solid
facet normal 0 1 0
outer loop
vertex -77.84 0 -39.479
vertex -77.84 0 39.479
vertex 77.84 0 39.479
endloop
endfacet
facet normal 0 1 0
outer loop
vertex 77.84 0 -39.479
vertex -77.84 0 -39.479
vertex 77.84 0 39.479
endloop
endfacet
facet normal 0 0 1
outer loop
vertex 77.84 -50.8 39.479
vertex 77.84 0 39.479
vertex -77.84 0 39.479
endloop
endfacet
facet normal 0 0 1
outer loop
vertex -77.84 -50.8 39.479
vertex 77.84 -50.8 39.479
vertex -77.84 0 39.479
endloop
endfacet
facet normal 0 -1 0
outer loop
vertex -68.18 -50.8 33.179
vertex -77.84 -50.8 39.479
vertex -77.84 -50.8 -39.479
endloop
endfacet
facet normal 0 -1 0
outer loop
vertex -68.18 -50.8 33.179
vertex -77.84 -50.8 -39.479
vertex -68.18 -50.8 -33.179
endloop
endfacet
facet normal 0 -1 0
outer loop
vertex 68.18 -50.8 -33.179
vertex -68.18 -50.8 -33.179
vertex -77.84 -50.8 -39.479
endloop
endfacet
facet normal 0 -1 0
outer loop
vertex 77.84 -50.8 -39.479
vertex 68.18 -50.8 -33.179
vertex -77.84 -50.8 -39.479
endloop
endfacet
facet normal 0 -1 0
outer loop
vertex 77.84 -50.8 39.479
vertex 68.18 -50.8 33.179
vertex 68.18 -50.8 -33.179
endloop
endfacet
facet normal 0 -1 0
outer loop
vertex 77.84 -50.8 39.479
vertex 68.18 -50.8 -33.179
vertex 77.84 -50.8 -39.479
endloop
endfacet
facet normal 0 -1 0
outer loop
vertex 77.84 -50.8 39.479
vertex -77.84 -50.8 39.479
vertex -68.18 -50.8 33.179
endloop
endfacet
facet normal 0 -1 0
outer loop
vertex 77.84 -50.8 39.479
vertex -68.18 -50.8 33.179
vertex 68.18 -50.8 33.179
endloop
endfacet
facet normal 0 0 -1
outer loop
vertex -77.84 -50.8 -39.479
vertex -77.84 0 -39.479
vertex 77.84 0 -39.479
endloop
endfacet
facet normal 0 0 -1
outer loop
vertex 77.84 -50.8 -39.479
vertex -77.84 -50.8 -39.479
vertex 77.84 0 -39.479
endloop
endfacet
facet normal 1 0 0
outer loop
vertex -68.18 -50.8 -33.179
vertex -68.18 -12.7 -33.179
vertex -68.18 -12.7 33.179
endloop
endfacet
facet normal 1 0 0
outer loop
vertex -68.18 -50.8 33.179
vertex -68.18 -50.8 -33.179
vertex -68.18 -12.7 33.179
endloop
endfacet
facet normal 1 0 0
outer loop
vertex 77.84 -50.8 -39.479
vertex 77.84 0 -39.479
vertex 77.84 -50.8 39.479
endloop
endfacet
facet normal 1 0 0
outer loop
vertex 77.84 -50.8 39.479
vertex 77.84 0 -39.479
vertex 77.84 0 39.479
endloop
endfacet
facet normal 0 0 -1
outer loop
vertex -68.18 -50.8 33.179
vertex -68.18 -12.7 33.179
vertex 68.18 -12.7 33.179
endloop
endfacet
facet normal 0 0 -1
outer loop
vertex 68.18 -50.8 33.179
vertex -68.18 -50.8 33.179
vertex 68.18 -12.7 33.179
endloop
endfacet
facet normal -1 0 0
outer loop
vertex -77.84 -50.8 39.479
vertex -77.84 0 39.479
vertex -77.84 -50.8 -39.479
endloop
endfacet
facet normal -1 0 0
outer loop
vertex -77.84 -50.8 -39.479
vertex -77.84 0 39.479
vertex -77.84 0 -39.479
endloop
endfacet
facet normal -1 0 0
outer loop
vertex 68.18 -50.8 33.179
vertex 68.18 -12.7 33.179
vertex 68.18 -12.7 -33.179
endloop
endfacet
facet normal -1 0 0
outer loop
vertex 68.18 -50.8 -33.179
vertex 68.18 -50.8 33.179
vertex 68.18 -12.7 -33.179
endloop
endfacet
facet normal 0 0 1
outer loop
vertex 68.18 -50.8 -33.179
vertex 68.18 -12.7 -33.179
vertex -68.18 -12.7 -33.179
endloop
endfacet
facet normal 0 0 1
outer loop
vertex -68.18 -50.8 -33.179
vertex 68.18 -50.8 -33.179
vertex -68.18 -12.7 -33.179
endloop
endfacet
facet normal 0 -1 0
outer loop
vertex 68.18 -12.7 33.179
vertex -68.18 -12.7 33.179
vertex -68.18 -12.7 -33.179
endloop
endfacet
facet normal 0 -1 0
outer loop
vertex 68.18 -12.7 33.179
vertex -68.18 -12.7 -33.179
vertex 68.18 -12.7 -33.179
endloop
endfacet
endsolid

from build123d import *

# Parameters (mm, degrees)
F1_DEPTH = 50.8
F0_W     = 68.1800022721
F0_H     = 33.179204911
F2_DEPTH = 12.7


with BuildPart() as f1:
    # F0 (on Front) → F1 (new body)
    with BuildSketch(Plane.XZ):
        Polygon((-77.840000391, 0), (-68.1800022721, 0), (-68.1800022721, 33.179204911), (0, 33.179204911), (0, 39.4792035222), (-77.840000391, 39.4792035222), align=None)
        Polygon((-68.1800022721, -33.179204911), (-68.1800022721, 0), (-77.840000391, 0), (-77.840000391, -39.4792035222), (0, -39.4792035222), (0, -33.179204911), align=None)
        Polygon((0, 39.4792035222), (0, 33.179204911), (68.1800022721, 33.179204911), (68.1800022721, 0), (77.840000391, 0), (77.840000391, 39.4792035222), align=None)
        Polygon((77.840000391, 0), (68.1800022721, 0), (68.1800022721, -33.179204911), (0, -33.179204911), (0, -39.4792035222), (77.840000391, -39.4792035222), align=None)
    extrude(amount=F1_DEPTH)

    # F0 (on Front) → F2 (join)
    with BuildSketch(Plane.XZ):
        with Locations((-34.0900011361, 16.5896024555)):
            Rectangle(F0_W, F0_H)
        with Locations((34.0900011361, 16.5896024555)):
            Rectangle(F0_W, F0_H)
        with Locations((34.0900011361, -16.5896024555)):
            Rectangle(F0_W, F0_H)
        with Locations((-34.0900011361, -16.5896024555)):
            Rectangle(F0_W, F0_H)
    extrude(amount=F2_DEPTH)


solid = f1.part
